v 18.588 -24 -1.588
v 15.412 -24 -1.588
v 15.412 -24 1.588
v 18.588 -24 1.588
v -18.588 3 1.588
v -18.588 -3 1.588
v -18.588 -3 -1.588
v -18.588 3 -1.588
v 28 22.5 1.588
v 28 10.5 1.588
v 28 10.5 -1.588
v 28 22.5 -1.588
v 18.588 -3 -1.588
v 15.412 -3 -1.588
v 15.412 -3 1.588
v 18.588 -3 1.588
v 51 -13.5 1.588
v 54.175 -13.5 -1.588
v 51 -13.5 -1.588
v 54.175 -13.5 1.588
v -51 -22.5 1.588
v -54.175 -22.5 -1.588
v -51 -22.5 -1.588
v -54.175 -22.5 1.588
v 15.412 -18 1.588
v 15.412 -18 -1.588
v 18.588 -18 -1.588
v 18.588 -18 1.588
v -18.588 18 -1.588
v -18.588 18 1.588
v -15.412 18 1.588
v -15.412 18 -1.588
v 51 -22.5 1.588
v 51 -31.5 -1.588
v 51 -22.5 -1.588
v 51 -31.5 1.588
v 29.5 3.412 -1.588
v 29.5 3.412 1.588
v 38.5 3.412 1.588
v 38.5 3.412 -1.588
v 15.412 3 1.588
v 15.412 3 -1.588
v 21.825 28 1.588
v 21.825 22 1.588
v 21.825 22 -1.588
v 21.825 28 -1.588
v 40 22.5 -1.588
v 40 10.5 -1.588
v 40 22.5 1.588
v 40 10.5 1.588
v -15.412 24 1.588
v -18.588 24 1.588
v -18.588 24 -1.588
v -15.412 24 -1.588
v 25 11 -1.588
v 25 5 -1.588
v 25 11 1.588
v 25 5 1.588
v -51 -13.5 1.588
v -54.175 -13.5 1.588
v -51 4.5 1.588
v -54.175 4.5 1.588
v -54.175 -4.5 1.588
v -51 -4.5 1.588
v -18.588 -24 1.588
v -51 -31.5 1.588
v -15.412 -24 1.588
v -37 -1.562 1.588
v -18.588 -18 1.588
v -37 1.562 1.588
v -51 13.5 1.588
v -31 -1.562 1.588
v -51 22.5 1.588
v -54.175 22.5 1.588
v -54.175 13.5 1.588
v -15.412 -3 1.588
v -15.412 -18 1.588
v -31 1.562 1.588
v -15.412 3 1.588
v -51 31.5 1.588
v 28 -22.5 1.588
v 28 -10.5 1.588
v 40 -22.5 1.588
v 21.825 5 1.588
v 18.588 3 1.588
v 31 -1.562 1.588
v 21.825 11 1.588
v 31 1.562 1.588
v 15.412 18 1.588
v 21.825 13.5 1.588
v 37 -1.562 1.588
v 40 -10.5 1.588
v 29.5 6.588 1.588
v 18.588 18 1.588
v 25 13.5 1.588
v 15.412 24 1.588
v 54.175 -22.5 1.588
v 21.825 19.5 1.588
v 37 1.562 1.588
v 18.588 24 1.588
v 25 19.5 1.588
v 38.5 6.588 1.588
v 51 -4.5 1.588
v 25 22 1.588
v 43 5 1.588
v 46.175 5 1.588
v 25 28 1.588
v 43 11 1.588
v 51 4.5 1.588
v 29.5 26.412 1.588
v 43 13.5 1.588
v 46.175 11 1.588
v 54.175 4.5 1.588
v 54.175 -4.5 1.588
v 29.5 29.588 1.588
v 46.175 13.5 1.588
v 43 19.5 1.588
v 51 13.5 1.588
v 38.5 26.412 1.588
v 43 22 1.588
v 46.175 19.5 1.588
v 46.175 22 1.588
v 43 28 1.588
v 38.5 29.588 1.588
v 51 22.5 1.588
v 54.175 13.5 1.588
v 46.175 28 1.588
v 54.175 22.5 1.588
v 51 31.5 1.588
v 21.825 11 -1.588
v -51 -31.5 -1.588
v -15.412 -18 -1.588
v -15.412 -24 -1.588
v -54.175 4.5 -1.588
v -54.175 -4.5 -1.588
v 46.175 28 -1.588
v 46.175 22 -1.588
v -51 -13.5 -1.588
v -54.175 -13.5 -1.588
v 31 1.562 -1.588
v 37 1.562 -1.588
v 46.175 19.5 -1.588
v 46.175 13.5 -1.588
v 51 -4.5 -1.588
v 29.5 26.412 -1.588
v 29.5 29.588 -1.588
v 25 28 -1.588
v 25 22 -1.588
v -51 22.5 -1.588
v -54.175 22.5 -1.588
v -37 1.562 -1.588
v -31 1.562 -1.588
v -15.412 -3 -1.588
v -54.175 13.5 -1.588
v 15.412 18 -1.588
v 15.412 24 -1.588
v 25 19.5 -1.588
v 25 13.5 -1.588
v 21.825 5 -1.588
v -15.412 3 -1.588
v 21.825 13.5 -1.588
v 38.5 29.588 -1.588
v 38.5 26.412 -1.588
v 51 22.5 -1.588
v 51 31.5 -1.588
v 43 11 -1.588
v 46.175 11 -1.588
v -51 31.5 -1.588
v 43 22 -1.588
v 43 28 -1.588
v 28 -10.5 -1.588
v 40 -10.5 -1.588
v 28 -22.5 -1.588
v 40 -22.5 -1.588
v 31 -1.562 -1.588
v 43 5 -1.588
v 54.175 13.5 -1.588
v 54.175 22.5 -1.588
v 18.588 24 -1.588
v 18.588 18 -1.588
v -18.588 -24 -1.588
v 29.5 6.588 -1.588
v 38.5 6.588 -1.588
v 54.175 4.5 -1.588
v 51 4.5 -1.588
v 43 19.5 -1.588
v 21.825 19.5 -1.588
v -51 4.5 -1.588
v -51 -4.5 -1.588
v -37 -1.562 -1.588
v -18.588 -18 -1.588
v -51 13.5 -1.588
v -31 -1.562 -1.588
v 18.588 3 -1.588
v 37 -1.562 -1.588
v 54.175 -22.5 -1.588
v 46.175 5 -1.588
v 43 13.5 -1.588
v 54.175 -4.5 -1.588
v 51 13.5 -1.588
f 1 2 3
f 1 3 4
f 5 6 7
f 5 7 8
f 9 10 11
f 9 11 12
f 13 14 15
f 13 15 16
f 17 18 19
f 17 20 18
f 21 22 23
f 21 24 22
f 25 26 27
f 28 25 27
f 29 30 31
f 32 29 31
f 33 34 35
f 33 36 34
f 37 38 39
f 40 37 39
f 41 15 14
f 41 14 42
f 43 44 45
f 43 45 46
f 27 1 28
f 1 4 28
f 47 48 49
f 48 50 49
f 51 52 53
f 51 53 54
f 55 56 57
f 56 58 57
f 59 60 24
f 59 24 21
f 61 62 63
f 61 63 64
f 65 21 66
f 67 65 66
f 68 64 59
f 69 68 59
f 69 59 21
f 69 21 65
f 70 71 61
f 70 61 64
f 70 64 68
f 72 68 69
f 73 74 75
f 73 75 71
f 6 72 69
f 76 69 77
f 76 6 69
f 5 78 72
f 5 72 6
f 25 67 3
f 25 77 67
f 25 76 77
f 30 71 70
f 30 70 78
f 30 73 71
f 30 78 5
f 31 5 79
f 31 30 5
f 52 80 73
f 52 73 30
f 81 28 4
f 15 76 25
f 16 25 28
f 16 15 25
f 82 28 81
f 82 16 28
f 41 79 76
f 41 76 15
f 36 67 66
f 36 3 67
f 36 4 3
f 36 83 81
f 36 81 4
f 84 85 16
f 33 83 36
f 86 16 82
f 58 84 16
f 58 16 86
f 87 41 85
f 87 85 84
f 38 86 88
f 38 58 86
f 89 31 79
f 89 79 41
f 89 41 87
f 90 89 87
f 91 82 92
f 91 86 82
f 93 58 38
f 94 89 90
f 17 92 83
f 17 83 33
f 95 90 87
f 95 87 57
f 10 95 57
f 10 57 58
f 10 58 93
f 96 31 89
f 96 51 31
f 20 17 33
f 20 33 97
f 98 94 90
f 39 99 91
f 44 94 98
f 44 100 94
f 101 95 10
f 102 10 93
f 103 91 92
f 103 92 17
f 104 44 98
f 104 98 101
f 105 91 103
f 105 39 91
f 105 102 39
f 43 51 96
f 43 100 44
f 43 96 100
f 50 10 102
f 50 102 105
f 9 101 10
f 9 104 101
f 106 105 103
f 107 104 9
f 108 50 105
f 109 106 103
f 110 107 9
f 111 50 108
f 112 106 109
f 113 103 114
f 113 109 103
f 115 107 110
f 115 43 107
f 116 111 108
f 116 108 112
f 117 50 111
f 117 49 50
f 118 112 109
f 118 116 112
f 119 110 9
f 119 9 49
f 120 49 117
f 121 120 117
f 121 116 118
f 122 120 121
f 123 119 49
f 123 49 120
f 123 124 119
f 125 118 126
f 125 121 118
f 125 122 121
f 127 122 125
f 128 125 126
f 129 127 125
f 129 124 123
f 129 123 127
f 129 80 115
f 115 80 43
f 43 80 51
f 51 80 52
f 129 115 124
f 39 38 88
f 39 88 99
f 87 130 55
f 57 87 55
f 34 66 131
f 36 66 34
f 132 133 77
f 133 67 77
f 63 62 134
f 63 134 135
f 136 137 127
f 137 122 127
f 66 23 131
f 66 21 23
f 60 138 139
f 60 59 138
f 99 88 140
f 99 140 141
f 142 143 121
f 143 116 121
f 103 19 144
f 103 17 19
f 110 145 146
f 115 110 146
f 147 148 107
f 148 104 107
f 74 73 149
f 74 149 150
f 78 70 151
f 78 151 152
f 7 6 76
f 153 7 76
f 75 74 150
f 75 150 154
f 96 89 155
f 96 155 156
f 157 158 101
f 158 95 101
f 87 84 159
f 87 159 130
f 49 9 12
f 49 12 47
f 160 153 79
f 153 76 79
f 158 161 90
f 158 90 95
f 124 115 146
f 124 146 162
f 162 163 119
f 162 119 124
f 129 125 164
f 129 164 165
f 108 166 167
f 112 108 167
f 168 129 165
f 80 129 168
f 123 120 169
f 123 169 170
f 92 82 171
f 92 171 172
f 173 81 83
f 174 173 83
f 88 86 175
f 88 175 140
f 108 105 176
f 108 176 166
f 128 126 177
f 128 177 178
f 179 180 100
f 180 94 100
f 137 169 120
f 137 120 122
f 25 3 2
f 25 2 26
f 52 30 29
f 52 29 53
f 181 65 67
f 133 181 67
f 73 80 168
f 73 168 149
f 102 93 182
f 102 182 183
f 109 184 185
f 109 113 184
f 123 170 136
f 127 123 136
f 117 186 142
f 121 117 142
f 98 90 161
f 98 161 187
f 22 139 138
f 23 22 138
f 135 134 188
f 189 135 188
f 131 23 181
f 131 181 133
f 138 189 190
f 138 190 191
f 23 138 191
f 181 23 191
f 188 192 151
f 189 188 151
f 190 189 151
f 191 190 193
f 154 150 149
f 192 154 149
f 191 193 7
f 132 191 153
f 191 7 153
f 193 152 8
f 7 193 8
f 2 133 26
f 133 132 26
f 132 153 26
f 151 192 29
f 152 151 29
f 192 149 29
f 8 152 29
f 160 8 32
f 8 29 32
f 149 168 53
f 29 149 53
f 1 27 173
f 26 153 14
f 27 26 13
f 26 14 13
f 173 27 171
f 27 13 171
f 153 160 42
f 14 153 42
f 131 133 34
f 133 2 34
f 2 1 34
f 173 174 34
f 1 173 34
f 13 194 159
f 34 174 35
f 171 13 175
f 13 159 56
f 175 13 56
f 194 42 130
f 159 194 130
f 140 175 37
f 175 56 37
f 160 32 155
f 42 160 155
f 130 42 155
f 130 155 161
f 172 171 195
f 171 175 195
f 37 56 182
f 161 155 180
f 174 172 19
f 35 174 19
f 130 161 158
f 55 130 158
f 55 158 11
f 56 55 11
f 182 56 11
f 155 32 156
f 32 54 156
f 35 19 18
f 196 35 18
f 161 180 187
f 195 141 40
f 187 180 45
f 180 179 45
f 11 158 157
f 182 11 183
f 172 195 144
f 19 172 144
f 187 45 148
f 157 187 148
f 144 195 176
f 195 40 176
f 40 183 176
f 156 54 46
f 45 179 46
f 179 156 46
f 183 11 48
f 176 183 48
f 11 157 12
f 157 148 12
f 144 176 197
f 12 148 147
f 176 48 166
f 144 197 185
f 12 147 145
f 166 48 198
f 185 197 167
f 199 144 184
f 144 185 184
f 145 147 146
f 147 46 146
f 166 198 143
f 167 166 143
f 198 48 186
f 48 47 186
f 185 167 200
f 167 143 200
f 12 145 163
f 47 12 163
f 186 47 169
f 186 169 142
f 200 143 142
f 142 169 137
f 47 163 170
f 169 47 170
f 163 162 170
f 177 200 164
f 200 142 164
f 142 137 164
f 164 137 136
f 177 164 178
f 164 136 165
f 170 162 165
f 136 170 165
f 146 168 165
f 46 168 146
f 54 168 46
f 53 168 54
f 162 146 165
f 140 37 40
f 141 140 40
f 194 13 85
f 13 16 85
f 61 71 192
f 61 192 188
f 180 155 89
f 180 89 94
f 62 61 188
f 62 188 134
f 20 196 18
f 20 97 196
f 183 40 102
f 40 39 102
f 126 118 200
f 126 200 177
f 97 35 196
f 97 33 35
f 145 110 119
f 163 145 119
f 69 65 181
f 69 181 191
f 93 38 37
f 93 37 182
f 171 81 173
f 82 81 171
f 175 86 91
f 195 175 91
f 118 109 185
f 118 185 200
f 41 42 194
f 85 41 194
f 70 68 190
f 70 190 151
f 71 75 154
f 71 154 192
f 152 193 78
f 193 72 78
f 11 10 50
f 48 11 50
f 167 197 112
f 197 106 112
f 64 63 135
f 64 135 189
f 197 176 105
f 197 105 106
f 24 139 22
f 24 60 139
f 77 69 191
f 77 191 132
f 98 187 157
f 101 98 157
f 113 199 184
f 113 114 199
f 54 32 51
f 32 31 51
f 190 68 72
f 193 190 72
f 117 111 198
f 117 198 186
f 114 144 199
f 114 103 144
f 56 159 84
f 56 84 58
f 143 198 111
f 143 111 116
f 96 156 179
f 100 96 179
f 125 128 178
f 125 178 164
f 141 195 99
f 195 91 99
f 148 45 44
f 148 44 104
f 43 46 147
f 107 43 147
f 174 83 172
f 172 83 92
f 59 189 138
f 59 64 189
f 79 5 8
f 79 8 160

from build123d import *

# Parameters (mm, degrees)
SKETCH1_W           = 6
SKETCH1_H           = 3.125
SKETCH1_W_2         = 9
SKETCH1_H_2         = 3.175
SKETCH1_W_3         = 12
SKETCH1_H_3         = 12
SKETCH1_W_4         = 3.175
SKETCH1_H_4         = 6
BOSS_EXTRUDE1_DEPTH = 1.5875


with BuildPart() as part:
    # Sketch1 → Boss-Extrude1 (new, symmetric)
    with BuildSketch(Plane.XY):
        Polygon((54.175, 4.5), (51, 4.5), (51, 13.5), (54.175, 13.5), (54.175, 22.5), (51, 22.5), (51, 31.5), (-51, 31.5), (-51, 22.5), (-54.175, 22.5), (-54.175, 13.5), (-51, 13.5), (-51, 4.5), (-54.175, 4.5), (-54.175, -4.5), (-51, -4.5), (-51, -13.5), (-54.175, -13.5), (-54.175, -22.5), (-51, -22.5), (-51, -31.5), (51, -31.5), (51, -22.5), (54.175, -22.5), (54.175, -13.5), (51, -13.5), (51, -4.5), (54.175, -4.5), align=None)
        with Locations((34, 0)):
            Rectangle(SKETCH1_W, SKETCH1_H, mode=Mode.SUBTRACT)
        with Locations((34, 5)):
            Rectangle(SKETCH1_W_2, SKETCH1_H_2, mode=Mode.SUBTRACT)
        with Locations((34, 16.5)):
            Rectangle(SKETCH1_W_3, SKETCH1_H_3, mode=Mode.SUBTRACT)
        with Locations((34, 28)):
            Rectangle(SKETCH1_W_2, SKETCH1_H_2, mode=Mode.SUBTRACT)
        with Locations((44.5875, 8)):
            Rectangle(SKETCH1_W_4, SKETCH1_H_4, mode=Mode.SUBTRACT)
        with Locations((44.5875, 16.5)):
            Rectangle(SKETCH1_W_4, SKETCH1_H_4, mode=Mode.SUBTRACT)
        with Locations((44.5875, 25)):
            Rectangle(SKETCH1_W_4, SKETCH1_H_4, mode=Mode.SUBTRACT)
        with Locations((34, -16.5)):
            Rectangle(SKETCH1_W_3, SKETCH1_H_3, mode=Mode.SUBTRACT)
        with Locations((17, 21)):
            Rectangle(SKETCH1_W_4, SKETCH1_H_4, mode=Mode.SUBTRACT)
        with Locations((23.4125, 25)):
            Rectangle(SKETCH1_W_4, SKETCH1_H_4, mode=Mode.SUBTRACT)
        with Locations((-17, -21)):
            Rectangle(SKETCH1_W_4, SKETCH1_H_4, mode=Mode.SUBTRACT)
        with Locations((17, -21)):
            Rectangle(SKETCH1_W_4, SKETCH1_H_4, mode=Mode.SUBTRACT)
        with Locations((-34, 0)):
            Rectangle(SKETCH1_W, SKETCH1_H, mode=Mode.SUBTRACT)
        with Locations((-17, 0)):
            Rectangle(SKETCH1_W_4, SKETCH1_H_4, mode=Mode.SUBTRACT)
        with Locations((-17, 21)):
            Rectangle(SKETCH1_W_4, SKETCH1_H_4, mode=Mode.SUBTRACT)
        with Locations((17, 0)):
            Rectangle(SKETCH1_W_4, SKETCH1_H_4, mode=Mode.SUBTRACT)
        with Locations((23.4125, 8)):
            Rectangle(SKETCH1_W_4, SKETCH1_H_4, mode=Mode.SUBTRACT)
        with Locations((23.4125, 16.5)):
            Rectangle(SKETCH1_W_4, SKETCH1_H_4, mode=Mode.SUBTRACT)
    extrude(amount=BOSS_EXTRUDE1_DEPTH, both=True)


solid = part.part
